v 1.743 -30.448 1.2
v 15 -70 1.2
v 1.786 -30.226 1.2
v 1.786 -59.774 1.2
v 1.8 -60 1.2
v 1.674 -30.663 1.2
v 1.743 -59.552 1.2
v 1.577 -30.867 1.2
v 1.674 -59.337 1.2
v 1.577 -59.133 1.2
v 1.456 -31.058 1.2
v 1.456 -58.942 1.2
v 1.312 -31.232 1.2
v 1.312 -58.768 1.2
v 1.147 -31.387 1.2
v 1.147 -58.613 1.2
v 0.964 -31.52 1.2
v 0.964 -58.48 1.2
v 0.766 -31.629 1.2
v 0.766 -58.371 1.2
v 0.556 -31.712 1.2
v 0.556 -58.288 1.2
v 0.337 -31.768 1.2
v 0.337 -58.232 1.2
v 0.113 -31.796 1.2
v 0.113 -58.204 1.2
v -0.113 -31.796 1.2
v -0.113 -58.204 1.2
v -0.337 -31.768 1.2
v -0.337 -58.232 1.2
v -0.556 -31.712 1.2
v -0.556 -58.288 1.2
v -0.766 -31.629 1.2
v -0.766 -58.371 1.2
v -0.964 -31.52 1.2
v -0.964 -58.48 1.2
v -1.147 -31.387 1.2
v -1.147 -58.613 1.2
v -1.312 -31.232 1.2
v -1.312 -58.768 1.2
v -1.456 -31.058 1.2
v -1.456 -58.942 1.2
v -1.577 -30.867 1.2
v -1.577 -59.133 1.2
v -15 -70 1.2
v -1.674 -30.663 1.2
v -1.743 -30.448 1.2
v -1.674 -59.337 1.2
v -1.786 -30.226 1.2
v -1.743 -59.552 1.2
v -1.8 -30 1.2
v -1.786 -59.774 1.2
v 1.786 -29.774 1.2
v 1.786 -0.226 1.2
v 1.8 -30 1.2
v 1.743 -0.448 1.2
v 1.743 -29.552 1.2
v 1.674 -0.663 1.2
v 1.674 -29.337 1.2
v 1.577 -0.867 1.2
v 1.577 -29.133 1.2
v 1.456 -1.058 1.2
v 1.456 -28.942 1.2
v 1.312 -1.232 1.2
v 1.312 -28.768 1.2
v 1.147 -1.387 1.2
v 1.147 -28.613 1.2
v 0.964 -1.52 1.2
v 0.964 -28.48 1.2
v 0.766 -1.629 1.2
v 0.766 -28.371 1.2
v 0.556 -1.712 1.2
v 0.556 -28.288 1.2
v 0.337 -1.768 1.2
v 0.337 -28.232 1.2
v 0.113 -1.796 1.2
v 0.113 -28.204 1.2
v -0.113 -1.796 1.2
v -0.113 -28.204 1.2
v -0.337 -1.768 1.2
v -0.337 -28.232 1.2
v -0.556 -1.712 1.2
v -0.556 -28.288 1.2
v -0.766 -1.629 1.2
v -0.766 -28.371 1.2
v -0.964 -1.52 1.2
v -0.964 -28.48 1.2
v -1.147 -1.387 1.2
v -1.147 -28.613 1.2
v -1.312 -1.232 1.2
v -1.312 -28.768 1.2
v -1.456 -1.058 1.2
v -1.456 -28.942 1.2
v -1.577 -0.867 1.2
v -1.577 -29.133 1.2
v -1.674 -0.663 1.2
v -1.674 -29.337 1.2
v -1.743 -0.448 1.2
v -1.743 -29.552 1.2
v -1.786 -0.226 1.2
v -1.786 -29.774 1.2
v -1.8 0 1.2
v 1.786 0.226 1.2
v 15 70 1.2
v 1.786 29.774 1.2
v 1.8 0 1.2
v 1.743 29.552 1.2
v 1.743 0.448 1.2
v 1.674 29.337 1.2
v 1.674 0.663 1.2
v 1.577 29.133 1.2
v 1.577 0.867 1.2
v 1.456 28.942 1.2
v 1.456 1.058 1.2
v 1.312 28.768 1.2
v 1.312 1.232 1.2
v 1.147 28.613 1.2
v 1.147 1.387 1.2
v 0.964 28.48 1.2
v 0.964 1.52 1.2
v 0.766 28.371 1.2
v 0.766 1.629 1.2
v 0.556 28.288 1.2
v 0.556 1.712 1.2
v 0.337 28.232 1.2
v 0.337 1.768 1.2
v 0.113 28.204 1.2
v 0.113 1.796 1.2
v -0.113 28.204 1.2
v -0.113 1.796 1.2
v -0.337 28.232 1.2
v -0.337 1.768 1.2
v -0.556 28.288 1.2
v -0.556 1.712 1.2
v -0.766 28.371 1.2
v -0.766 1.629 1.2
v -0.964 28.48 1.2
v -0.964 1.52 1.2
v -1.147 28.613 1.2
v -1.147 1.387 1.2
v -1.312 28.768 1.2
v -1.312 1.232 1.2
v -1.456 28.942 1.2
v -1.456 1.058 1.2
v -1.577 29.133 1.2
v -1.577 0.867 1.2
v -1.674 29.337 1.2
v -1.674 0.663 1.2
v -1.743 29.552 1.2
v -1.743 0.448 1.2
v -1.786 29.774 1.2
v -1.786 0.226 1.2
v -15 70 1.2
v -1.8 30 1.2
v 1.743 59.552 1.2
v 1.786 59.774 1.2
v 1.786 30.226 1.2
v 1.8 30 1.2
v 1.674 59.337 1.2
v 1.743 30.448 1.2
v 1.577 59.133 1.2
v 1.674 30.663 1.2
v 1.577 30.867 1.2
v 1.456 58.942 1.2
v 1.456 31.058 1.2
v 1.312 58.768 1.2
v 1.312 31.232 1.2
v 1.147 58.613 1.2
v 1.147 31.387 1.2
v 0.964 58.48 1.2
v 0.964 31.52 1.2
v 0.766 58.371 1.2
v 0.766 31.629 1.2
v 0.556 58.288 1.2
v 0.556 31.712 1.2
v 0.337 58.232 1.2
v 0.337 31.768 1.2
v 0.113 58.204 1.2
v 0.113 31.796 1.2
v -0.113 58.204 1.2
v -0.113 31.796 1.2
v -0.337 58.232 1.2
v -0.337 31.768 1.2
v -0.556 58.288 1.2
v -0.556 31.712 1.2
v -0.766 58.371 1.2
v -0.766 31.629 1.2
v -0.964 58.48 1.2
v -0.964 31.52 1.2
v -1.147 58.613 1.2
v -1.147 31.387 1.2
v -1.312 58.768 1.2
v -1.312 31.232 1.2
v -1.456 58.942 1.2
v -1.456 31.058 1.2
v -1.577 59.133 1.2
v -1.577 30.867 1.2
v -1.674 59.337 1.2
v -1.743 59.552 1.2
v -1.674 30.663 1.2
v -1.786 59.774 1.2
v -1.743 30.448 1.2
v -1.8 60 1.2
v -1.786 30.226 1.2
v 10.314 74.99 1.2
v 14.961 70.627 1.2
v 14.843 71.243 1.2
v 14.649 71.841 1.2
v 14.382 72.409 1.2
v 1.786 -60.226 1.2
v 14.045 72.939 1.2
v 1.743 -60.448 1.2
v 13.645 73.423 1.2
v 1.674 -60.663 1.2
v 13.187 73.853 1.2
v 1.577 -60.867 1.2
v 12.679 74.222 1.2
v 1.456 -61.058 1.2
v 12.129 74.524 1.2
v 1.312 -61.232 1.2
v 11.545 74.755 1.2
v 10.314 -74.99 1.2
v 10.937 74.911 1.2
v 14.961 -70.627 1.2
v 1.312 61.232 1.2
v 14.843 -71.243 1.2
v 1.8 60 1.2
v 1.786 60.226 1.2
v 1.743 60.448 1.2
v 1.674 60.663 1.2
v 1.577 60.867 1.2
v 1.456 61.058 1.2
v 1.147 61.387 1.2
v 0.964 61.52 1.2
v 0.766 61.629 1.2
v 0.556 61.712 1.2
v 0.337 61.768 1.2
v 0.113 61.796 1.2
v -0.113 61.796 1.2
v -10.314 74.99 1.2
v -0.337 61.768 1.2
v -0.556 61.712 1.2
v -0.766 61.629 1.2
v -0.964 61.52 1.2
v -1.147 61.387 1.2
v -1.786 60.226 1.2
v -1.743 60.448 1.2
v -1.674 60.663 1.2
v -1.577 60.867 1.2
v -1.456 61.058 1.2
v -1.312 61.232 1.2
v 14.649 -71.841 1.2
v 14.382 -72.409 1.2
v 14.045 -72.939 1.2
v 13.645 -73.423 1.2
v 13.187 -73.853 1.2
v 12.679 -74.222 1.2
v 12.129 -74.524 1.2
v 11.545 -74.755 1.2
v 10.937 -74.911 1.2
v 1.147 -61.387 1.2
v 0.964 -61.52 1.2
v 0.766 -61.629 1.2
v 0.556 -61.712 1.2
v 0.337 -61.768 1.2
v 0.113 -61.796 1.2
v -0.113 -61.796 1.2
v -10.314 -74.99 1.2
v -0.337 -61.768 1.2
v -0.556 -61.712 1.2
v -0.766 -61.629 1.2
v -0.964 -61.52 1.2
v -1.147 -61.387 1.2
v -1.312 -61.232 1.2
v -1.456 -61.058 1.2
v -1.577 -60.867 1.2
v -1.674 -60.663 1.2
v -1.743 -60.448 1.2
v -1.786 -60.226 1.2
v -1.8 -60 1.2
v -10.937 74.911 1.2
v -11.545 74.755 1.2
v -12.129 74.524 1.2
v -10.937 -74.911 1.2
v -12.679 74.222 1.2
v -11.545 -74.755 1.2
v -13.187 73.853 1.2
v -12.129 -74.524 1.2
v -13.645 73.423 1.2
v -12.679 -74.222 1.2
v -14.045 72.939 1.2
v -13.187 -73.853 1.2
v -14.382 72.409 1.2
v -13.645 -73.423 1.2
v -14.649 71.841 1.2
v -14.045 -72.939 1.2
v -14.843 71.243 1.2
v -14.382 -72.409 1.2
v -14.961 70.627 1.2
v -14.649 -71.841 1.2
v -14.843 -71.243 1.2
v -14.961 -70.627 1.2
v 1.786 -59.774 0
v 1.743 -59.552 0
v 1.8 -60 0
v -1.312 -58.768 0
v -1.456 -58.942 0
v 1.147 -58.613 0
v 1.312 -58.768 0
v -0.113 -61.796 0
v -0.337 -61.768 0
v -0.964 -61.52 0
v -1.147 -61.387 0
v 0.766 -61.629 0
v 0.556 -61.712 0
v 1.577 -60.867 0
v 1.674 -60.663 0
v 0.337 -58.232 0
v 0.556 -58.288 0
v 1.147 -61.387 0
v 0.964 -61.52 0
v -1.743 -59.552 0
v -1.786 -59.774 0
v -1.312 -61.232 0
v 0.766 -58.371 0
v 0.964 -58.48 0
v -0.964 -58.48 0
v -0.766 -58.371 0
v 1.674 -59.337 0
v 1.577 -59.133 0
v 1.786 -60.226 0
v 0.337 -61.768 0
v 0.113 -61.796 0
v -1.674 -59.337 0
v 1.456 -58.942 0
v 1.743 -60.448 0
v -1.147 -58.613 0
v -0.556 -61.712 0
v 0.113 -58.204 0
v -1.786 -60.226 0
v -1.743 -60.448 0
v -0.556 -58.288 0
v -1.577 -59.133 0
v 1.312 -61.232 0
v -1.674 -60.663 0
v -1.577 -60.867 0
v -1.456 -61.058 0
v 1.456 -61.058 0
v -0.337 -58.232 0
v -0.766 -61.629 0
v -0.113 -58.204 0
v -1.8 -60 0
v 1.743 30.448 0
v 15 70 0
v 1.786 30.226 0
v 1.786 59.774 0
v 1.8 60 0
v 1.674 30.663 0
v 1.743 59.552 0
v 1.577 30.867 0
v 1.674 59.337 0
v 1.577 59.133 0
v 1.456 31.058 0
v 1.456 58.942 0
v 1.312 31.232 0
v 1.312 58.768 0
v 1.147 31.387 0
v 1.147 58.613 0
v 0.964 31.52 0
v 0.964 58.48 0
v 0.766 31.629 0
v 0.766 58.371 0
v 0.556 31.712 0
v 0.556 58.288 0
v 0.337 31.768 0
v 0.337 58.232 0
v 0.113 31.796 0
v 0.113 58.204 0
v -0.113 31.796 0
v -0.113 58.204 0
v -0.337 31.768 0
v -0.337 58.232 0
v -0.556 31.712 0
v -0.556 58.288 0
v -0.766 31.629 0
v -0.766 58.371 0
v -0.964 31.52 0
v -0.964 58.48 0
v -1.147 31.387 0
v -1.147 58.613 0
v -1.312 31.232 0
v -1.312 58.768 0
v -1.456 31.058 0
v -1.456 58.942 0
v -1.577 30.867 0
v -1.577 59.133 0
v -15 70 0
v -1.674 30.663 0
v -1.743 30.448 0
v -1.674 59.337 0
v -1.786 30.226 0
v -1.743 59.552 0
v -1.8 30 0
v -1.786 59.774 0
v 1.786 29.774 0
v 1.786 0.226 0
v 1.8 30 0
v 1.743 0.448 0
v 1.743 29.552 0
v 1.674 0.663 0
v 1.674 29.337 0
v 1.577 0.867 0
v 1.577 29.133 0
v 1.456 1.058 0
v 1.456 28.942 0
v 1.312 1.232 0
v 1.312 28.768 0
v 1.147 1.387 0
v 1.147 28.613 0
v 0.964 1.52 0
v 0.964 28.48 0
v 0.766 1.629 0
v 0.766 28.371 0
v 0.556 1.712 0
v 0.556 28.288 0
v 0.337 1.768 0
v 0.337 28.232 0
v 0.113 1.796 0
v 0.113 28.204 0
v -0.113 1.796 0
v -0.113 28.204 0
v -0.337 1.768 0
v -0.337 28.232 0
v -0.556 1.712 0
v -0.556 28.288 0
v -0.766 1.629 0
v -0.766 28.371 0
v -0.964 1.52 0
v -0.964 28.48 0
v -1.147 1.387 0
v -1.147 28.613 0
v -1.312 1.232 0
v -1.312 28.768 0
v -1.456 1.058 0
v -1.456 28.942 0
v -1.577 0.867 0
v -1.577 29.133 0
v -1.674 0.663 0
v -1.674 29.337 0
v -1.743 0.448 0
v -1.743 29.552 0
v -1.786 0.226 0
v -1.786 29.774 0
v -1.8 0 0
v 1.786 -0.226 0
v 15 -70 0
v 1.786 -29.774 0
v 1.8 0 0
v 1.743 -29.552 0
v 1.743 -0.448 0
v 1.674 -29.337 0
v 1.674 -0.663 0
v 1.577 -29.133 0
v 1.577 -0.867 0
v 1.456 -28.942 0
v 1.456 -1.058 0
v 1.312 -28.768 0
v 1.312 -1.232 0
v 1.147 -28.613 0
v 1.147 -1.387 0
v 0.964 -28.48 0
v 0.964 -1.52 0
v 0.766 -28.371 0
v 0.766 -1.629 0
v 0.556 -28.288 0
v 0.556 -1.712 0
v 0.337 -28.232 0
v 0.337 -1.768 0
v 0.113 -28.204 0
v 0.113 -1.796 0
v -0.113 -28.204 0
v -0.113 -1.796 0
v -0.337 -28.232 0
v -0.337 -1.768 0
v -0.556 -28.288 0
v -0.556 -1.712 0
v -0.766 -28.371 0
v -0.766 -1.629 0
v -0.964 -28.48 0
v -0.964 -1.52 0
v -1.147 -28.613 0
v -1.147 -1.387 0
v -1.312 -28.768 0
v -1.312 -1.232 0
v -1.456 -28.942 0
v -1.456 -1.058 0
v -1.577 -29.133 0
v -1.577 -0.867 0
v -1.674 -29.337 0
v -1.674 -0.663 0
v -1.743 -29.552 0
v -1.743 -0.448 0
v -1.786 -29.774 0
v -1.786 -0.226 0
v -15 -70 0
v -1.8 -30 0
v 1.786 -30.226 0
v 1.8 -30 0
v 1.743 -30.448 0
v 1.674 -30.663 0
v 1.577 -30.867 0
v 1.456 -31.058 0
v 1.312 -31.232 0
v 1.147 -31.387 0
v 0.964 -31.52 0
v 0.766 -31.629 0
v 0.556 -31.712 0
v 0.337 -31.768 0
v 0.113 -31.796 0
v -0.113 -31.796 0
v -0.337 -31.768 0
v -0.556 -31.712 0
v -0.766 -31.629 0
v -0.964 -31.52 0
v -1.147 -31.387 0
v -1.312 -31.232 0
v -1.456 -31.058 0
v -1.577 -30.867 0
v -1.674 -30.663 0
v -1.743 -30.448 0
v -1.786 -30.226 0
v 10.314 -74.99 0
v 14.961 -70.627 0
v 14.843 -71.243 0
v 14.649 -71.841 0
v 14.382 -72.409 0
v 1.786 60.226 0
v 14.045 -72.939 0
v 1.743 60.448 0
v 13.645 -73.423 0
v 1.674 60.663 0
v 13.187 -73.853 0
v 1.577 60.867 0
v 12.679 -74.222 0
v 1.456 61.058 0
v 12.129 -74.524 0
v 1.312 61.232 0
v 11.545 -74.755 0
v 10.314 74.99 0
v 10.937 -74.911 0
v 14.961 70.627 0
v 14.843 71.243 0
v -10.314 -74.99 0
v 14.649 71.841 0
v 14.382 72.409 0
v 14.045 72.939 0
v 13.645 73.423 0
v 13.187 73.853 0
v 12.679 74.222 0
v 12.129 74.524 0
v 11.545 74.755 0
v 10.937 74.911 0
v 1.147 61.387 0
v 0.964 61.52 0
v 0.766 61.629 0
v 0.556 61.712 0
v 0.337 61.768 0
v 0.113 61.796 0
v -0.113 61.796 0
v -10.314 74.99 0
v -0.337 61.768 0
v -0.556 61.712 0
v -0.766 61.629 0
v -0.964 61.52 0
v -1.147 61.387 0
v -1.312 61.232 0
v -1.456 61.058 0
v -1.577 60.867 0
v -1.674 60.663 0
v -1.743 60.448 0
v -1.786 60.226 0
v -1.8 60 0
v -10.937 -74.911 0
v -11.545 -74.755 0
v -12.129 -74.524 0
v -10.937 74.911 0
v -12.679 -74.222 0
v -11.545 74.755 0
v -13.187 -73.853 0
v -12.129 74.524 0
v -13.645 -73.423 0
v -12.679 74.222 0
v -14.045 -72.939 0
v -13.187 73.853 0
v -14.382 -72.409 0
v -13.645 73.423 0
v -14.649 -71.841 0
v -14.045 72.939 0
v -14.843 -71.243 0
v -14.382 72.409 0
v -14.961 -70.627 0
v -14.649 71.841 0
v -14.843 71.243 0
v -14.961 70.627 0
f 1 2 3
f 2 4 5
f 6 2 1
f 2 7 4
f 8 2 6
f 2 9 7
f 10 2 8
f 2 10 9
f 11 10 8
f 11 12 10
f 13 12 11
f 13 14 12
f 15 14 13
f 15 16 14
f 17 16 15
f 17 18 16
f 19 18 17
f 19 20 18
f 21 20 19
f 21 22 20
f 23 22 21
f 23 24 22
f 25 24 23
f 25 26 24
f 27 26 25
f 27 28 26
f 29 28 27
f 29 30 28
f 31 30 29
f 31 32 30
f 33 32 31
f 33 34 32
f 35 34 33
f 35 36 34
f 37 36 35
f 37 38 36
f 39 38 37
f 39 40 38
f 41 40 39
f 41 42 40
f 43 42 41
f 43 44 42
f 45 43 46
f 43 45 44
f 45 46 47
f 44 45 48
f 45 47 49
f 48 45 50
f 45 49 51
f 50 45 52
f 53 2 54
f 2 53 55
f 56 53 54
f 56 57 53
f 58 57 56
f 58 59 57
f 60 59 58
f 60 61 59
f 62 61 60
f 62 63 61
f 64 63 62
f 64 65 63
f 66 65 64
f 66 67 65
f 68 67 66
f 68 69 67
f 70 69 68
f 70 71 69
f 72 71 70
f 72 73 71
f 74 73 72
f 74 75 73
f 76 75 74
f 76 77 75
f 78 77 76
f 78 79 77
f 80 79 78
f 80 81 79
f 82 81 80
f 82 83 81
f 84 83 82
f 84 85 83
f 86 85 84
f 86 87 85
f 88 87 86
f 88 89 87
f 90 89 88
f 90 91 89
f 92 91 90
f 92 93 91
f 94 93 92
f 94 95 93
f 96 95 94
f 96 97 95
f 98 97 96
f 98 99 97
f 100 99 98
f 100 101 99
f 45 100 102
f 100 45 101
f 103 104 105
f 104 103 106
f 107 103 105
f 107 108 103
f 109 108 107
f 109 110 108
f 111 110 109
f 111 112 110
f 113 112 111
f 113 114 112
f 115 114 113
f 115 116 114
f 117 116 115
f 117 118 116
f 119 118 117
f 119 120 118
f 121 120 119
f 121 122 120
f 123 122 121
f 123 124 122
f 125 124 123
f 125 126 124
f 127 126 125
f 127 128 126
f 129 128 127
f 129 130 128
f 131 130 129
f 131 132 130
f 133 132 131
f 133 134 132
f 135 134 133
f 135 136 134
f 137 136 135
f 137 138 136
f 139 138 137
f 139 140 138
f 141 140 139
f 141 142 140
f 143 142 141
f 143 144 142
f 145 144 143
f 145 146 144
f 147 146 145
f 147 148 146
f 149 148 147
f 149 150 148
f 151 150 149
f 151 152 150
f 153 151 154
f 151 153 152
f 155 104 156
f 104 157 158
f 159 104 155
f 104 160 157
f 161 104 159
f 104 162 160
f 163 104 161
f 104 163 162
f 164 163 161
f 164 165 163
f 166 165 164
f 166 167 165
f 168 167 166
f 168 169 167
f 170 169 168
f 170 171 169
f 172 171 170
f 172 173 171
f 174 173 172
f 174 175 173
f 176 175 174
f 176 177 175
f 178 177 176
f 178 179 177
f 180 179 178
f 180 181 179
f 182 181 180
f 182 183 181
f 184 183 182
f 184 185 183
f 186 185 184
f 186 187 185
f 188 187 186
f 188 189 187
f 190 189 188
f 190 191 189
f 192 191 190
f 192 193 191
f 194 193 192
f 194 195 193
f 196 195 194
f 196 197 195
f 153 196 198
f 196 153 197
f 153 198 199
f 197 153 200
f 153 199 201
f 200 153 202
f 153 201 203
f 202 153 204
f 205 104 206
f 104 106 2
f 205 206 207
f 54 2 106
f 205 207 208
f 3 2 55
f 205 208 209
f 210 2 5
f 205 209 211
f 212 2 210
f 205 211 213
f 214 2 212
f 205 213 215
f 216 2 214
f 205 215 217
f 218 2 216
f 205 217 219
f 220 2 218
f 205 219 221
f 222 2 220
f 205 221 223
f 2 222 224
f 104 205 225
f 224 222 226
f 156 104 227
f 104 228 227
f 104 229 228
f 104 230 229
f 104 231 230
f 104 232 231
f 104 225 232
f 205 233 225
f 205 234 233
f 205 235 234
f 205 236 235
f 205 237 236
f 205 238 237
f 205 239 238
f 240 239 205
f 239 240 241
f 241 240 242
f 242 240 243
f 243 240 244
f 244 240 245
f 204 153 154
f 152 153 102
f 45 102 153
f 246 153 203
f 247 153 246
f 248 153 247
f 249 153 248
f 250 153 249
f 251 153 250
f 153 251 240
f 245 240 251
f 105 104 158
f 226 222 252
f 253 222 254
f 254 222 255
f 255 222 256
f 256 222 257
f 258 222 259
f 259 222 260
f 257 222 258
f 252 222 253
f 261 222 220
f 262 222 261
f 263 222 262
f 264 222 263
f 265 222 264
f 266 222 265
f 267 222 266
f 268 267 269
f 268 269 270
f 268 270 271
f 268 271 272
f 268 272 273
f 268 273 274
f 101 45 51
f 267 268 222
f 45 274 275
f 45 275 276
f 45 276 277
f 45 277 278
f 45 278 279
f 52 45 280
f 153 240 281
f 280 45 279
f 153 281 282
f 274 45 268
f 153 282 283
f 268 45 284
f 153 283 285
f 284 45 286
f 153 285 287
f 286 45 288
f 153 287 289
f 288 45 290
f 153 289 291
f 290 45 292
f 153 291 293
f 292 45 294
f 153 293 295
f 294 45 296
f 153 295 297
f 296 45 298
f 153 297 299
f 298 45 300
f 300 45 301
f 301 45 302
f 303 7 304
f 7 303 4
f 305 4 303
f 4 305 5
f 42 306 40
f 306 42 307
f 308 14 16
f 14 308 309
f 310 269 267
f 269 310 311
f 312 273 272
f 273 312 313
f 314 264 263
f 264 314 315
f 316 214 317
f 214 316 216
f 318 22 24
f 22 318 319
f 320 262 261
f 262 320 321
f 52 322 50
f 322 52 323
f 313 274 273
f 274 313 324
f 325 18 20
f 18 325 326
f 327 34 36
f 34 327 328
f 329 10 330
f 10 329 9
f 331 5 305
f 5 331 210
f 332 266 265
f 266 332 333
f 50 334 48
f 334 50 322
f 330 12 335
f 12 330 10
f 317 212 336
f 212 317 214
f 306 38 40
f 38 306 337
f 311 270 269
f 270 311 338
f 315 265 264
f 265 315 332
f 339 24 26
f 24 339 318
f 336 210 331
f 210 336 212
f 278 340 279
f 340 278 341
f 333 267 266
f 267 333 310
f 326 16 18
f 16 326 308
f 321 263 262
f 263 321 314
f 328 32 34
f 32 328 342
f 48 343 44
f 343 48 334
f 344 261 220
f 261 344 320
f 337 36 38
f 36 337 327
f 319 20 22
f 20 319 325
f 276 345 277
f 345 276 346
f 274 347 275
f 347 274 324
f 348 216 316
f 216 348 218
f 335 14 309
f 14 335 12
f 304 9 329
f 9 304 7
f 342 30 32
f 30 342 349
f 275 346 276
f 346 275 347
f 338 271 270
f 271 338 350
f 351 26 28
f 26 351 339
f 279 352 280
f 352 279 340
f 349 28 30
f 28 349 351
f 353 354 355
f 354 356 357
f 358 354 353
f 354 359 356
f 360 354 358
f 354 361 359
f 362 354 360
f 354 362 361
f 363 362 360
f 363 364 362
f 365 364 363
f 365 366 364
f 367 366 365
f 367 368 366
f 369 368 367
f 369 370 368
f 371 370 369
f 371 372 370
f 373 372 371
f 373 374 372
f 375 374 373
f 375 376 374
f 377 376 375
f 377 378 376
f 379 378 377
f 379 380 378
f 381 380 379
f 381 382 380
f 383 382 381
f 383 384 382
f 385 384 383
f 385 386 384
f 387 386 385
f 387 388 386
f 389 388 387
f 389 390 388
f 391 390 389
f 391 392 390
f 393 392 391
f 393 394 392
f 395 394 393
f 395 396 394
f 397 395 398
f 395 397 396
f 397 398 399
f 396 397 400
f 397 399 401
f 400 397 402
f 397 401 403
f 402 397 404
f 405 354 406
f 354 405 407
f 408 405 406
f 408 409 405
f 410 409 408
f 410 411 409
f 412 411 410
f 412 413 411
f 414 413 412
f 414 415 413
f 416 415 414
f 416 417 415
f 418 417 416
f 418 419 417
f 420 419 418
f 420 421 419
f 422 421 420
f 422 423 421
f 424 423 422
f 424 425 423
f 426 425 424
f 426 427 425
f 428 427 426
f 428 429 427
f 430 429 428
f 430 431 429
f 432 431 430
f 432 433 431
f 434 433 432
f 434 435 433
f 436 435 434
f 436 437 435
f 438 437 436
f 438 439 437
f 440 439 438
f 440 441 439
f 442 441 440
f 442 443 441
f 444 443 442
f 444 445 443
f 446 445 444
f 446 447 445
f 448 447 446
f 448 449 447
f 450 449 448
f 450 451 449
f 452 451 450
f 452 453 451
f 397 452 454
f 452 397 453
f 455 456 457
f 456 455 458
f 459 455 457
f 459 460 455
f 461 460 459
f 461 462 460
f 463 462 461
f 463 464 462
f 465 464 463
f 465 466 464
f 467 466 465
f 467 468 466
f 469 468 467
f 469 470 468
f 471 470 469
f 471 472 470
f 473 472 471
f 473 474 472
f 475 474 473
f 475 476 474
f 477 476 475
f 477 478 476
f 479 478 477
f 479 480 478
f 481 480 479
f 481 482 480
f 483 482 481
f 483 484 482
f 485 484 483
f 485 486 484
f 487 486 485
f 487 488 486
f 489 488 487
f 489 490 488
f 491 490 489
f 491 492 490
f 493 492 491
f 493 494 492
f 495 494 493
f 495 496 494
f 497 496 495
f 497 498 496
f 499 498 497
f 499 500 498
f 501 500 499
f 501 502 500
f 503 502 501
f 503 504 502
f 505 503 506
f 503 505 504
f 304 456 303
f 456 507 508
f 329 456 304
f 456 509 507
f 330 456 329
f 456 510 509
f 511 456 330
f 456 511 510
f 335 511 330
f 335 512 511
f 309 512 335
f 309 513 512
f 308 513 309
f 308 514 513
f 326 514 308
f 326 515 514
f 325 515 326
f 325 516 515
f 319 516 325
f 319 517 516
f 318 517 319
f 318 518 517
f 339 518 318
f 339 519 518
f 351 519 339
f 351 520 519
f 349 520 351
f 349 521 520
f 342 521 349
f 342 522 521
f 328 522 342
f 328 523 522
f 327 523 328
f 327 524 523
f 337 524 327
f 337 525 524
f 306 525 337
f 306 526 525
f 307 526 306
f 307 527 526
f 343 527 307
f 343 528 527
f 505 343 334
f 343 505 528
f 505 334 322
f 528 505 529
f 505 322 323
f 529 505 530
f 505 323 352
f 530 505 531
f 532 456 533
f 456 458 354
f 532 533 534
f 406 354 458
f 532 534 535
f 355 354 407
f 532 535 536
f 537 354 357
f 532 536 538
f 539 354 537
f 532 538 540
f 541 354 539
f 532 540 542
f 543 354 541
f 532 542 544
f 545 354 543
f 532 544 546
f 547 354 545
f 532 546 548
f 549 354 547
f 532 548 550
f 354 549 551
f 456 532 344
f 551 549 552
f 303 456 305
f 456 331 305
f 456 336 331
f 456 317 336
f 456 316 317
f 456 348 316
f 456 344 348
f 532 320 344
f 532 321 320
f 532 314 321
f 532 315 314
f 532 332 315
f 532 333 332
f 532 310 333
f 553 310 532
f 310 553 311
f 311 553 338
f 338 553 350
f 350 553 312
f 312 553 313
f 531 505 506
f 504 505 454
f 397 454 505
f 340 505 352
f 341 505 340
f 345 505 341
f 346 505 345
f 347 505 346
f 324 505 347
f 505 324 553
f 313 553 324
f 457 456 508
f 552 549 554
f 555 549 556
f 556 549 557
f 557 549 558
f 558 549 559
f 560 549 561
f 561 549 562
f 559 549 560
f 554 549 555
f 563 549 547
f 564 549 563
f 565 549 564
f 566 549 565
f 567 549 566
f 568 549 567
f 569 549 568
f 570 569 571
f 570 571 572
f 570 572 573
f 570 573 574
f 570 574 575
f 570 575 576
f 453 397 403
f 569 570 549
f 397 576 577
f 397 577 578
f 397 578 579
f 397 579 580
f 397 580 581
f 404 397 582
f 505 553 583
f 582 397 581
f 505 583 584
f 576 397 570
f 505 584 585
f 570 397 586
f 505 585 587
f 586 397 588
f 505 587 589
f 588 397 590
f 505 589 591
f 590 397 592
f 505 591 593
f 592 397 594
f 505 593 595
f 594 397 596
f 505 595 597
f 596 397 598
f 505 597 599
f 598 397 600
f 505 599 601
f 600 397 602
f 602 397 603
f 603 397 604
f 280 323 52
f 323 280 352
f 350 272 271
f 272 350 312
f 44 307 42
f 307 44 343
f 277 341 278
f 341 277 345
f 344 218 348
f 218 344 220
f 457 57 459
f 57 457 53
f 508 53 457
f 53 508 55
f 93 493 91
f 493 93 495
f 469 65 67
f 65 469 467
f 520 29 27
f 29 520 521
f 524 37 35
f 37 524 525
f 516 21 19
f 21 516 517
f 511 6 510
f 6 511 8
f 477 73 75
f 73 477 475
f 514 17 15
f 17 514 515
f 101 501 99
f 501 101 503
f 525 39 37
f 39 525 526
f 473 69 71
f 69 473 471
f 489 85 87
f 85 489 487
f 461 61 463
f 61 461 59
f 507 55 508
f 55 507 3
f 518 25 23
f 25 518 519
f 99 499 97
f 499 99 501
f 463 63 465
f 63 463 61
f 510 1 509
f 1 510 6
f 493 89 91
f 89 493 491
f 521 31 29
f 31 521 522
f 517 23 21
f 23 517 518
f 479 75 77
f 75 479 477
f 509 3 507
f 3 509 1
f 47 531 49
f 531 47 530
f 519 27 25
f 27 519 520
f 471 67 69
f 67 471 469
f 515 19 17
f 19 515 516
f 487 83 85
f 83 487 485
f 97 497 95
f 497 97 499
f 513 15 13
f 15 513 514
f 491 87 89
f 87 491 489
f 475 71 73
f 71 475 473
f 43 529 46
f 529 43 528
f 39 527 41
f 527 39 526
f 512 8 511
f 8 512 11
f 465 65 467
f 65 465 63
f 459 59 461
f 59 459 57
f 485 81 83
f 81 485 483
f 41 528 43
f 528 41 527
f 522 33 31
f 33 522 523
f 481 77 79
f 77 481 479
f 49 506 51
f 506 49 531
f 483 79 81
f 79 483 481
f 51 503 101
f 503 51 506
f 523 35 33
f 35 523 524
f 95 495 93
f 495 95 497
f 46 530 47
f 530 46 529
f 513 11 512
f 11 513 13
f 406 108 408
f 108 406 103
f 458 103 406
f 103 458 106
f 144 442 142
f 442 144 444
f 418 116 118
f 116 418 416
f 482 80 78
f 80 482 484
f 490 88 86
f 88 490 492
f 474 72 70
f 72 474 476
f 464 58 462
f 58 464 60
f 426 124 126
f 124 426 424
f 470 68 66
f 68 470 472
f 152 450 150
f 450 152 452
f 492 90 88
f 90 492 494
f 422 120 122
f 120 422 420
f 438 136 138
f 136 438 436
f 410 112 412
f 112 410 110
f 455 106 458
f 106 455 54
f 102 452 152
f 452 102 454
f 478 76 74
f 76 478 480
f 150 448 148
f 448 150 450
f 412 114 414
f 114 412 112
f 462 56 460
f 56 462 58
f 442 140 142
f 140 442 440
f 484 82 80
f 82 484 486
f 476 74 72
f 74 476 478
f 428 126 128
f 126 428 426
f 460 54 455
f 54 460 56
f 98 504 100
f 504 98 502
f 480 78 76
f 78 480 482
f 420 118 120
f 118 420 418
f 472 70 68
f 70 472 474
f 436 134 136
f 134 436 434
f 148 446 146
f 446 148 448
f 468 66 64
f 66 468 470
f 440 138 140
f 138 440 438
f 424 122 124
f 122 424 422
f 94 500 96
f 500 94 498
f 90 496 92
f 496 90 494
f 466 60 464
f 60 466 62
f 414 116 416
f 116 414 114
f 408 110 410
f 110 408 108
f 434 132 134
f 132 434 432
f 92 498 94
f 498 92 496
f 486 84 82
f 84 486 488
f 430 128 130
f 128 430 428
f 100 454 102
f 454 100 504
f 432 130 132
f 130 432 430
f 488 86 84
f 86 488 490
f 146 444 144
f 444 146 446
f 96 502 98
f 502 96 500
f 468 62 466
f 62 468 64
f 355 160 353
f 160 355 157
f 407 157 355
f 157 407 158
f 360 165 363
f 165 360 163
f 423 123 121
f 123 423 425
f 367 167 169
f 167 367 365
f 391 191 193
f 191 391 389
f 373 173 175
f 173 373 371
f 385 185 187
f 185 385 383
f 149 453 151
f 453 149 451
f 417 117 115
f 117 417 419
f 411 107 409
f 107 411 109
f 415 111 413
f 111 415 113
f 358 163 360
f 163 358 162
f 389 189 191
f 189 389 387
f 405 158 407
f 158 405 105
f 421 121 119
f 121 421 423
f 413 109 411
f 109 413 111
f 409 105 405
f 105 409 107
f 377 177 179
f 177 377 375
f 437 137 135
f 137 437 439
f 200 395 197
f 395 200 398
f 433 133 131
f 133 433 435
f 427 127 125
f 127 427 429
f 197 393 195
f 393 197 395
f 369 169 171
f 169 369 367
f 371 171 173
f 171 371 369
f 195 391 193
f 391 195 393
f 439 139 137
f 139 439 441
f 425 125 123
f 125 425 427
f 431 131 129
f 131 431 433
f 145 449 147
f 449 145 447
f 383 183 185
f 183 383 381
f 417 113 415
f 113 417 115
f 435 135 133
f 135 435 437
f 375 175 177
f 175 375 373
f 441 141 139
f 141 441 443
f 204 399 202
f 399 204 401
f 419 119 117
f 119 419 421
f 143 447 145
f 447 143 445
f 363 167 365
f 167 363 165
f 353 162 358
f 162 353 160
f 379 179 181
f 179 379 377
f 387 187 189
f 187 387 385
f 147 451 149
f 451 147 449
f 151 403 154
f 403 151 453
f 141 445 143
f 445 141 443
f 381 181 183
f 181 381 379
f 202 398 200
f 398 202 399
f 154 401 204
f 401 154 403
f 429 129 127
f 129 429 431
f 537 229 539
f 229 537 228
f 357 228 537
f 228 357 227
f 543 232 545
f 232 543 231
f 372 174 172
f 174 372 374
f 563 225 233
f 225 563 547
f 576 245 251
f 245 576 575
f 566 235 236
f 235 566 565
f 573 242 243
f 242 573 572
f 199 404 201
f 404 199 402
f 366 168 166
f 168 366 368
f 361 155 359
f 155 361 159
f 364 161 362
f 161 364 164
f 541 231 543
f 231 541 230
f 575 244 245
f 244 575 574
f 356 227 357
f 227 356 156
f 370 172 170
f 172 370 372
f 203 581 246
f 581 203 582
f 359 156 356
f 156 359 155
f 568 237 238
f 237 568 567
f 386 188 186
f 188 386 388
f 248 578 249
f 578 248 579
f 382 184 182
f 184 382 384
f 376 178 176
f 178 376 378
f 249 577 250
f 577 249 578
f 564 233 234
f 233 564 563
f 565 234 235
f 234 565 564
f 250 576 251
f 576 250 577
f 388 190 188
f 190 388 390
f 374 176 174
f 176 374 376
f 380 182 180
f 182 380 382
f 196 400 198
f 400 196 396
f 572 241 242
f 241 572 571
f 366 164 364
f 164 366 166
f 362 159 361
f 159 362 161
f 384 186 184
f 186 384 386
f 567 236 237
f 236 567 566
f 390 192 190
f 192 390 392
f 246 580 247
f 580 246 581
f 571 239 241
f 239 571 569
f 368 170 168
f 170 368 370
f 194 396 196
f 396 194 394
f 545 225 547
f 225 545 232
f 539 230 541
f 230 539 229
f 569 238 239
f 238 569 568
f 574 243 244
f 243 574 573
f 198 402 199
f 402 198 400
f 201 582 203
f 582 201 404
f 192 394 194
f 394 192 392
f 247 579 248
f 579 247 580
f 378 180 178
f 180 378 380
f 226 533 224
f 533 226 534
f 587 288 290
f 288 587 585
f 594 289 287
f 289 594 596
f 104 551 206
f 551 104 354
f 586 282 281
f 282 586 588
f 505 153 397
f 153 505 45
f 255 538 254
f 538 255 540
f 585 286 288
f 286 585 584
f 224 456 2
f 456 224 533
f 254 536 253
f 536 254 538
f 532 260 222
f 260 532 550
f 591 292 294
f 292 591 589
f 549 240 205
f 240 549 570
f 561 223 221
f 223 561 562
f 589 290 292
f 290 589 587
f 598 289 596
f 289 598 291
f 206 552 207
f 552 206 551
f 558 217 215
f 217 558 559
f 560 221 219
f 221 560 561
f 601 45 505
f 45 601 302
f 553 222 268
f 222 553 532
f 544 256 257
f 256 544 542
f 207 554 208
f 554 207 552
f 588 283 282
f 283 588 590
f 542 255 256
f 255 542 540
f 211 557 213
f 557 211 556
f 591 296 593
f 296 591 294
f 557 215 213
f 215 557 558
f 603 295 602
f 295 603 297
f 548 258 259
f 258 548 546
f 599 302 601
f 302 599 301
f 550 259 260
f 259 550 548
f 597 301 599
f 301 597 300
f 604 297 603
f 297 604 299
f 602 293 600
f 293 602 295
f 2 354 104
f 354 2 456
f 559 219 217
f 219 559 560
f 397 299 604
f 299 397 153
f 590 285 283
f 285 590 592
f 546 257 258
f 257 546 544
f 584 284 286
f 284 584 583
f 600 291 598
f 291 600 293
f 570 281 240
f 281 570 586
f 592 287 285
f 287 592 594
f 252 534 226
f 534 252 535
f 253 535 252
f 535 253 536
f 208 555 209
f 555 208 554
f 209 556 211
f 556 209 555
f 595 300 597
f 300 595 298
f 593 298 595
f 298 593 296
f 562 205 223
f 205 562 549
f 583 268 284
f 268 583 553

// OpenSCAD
$fn = 50;


difference() {
	union() {
		hull() {
			translate(v = [-10.0000000000, 70.0000000000, 0]) {
				cylinder(h = 60, r = 5);
			}
			translate(v = [10.0000000000, 70.0000000000, 0]) {
				cylinder(h = 60, r = 5);
			}
			translate(v = [-10.0000000000, -70.0000000000, 0]) {
				cylinder(h = 60, r = 5);
			}
			translate(v = [10.0000000000, -70.0000000000, 0]) {
				cylinder(h = 60, r = 5);
			}
		}
	}
	union() {
		translate(v = [0, 0, 1.2000000000]) {
			hull() {
				translate(v = [-10.0000000000, 70.0000000000, 0]) {
					cylinder(h = 58.8000000000, r = 3.8000000000);
				}
				translate(v = [10.0000000000, 70.0000000000, 0]) {
					cylinder(h = 58.8000000000, r = 3.8000000000);
				}
				translate(v = [-10.0000000000, -70.0000000000, 0]) {
					cylinder(h = 58.8000000000, r = 3.8000000000);
				}
				translate(v = [10.0000000000, -70.0000000000, 0]) {
					cylinder(h = 58.8000000000, r = 3.8000000000);
				}
			}
		}
		#translate(v = [0.0000000000, -60.0000000000, 0]) {
			cylinder(h = 1.2000000000, r = 1.8000000000);
		}
		#translate(v = [0.0000000000, -30.0000000000, 0]) {
			cylinder(h = 1.2000000000, r = 1.8000000000);
		}
		#cylinder(h = 1.2000000000, r = 1.8000000000);
		#translate(v = [0.0000000000, 30.0000000000, 0]) {
			cylinder(h = 1.2000000000, r = 1.8000000000);
		}
		#translate(v = [0.0000000000, 60.0000000000, 0]) {
			cylinder(h = 1.2000000000, r = 1.8000000000);
		}
		translate(v = [-250.0000000000, -250.0000000000, 1.2000000000]) {
			cube(size = [500, 500, 500]);
		}
		translate(v = [-250.0000000000, -250.0000000000, 1.2000000000]) {
			cube(size = [500, 500, 500]);
		}
		translate(v = [-250.0000000000, -250.0000000000, 1.2000000000]) {
			cube(size = [500, 500, 500]);
		}
	}
}
